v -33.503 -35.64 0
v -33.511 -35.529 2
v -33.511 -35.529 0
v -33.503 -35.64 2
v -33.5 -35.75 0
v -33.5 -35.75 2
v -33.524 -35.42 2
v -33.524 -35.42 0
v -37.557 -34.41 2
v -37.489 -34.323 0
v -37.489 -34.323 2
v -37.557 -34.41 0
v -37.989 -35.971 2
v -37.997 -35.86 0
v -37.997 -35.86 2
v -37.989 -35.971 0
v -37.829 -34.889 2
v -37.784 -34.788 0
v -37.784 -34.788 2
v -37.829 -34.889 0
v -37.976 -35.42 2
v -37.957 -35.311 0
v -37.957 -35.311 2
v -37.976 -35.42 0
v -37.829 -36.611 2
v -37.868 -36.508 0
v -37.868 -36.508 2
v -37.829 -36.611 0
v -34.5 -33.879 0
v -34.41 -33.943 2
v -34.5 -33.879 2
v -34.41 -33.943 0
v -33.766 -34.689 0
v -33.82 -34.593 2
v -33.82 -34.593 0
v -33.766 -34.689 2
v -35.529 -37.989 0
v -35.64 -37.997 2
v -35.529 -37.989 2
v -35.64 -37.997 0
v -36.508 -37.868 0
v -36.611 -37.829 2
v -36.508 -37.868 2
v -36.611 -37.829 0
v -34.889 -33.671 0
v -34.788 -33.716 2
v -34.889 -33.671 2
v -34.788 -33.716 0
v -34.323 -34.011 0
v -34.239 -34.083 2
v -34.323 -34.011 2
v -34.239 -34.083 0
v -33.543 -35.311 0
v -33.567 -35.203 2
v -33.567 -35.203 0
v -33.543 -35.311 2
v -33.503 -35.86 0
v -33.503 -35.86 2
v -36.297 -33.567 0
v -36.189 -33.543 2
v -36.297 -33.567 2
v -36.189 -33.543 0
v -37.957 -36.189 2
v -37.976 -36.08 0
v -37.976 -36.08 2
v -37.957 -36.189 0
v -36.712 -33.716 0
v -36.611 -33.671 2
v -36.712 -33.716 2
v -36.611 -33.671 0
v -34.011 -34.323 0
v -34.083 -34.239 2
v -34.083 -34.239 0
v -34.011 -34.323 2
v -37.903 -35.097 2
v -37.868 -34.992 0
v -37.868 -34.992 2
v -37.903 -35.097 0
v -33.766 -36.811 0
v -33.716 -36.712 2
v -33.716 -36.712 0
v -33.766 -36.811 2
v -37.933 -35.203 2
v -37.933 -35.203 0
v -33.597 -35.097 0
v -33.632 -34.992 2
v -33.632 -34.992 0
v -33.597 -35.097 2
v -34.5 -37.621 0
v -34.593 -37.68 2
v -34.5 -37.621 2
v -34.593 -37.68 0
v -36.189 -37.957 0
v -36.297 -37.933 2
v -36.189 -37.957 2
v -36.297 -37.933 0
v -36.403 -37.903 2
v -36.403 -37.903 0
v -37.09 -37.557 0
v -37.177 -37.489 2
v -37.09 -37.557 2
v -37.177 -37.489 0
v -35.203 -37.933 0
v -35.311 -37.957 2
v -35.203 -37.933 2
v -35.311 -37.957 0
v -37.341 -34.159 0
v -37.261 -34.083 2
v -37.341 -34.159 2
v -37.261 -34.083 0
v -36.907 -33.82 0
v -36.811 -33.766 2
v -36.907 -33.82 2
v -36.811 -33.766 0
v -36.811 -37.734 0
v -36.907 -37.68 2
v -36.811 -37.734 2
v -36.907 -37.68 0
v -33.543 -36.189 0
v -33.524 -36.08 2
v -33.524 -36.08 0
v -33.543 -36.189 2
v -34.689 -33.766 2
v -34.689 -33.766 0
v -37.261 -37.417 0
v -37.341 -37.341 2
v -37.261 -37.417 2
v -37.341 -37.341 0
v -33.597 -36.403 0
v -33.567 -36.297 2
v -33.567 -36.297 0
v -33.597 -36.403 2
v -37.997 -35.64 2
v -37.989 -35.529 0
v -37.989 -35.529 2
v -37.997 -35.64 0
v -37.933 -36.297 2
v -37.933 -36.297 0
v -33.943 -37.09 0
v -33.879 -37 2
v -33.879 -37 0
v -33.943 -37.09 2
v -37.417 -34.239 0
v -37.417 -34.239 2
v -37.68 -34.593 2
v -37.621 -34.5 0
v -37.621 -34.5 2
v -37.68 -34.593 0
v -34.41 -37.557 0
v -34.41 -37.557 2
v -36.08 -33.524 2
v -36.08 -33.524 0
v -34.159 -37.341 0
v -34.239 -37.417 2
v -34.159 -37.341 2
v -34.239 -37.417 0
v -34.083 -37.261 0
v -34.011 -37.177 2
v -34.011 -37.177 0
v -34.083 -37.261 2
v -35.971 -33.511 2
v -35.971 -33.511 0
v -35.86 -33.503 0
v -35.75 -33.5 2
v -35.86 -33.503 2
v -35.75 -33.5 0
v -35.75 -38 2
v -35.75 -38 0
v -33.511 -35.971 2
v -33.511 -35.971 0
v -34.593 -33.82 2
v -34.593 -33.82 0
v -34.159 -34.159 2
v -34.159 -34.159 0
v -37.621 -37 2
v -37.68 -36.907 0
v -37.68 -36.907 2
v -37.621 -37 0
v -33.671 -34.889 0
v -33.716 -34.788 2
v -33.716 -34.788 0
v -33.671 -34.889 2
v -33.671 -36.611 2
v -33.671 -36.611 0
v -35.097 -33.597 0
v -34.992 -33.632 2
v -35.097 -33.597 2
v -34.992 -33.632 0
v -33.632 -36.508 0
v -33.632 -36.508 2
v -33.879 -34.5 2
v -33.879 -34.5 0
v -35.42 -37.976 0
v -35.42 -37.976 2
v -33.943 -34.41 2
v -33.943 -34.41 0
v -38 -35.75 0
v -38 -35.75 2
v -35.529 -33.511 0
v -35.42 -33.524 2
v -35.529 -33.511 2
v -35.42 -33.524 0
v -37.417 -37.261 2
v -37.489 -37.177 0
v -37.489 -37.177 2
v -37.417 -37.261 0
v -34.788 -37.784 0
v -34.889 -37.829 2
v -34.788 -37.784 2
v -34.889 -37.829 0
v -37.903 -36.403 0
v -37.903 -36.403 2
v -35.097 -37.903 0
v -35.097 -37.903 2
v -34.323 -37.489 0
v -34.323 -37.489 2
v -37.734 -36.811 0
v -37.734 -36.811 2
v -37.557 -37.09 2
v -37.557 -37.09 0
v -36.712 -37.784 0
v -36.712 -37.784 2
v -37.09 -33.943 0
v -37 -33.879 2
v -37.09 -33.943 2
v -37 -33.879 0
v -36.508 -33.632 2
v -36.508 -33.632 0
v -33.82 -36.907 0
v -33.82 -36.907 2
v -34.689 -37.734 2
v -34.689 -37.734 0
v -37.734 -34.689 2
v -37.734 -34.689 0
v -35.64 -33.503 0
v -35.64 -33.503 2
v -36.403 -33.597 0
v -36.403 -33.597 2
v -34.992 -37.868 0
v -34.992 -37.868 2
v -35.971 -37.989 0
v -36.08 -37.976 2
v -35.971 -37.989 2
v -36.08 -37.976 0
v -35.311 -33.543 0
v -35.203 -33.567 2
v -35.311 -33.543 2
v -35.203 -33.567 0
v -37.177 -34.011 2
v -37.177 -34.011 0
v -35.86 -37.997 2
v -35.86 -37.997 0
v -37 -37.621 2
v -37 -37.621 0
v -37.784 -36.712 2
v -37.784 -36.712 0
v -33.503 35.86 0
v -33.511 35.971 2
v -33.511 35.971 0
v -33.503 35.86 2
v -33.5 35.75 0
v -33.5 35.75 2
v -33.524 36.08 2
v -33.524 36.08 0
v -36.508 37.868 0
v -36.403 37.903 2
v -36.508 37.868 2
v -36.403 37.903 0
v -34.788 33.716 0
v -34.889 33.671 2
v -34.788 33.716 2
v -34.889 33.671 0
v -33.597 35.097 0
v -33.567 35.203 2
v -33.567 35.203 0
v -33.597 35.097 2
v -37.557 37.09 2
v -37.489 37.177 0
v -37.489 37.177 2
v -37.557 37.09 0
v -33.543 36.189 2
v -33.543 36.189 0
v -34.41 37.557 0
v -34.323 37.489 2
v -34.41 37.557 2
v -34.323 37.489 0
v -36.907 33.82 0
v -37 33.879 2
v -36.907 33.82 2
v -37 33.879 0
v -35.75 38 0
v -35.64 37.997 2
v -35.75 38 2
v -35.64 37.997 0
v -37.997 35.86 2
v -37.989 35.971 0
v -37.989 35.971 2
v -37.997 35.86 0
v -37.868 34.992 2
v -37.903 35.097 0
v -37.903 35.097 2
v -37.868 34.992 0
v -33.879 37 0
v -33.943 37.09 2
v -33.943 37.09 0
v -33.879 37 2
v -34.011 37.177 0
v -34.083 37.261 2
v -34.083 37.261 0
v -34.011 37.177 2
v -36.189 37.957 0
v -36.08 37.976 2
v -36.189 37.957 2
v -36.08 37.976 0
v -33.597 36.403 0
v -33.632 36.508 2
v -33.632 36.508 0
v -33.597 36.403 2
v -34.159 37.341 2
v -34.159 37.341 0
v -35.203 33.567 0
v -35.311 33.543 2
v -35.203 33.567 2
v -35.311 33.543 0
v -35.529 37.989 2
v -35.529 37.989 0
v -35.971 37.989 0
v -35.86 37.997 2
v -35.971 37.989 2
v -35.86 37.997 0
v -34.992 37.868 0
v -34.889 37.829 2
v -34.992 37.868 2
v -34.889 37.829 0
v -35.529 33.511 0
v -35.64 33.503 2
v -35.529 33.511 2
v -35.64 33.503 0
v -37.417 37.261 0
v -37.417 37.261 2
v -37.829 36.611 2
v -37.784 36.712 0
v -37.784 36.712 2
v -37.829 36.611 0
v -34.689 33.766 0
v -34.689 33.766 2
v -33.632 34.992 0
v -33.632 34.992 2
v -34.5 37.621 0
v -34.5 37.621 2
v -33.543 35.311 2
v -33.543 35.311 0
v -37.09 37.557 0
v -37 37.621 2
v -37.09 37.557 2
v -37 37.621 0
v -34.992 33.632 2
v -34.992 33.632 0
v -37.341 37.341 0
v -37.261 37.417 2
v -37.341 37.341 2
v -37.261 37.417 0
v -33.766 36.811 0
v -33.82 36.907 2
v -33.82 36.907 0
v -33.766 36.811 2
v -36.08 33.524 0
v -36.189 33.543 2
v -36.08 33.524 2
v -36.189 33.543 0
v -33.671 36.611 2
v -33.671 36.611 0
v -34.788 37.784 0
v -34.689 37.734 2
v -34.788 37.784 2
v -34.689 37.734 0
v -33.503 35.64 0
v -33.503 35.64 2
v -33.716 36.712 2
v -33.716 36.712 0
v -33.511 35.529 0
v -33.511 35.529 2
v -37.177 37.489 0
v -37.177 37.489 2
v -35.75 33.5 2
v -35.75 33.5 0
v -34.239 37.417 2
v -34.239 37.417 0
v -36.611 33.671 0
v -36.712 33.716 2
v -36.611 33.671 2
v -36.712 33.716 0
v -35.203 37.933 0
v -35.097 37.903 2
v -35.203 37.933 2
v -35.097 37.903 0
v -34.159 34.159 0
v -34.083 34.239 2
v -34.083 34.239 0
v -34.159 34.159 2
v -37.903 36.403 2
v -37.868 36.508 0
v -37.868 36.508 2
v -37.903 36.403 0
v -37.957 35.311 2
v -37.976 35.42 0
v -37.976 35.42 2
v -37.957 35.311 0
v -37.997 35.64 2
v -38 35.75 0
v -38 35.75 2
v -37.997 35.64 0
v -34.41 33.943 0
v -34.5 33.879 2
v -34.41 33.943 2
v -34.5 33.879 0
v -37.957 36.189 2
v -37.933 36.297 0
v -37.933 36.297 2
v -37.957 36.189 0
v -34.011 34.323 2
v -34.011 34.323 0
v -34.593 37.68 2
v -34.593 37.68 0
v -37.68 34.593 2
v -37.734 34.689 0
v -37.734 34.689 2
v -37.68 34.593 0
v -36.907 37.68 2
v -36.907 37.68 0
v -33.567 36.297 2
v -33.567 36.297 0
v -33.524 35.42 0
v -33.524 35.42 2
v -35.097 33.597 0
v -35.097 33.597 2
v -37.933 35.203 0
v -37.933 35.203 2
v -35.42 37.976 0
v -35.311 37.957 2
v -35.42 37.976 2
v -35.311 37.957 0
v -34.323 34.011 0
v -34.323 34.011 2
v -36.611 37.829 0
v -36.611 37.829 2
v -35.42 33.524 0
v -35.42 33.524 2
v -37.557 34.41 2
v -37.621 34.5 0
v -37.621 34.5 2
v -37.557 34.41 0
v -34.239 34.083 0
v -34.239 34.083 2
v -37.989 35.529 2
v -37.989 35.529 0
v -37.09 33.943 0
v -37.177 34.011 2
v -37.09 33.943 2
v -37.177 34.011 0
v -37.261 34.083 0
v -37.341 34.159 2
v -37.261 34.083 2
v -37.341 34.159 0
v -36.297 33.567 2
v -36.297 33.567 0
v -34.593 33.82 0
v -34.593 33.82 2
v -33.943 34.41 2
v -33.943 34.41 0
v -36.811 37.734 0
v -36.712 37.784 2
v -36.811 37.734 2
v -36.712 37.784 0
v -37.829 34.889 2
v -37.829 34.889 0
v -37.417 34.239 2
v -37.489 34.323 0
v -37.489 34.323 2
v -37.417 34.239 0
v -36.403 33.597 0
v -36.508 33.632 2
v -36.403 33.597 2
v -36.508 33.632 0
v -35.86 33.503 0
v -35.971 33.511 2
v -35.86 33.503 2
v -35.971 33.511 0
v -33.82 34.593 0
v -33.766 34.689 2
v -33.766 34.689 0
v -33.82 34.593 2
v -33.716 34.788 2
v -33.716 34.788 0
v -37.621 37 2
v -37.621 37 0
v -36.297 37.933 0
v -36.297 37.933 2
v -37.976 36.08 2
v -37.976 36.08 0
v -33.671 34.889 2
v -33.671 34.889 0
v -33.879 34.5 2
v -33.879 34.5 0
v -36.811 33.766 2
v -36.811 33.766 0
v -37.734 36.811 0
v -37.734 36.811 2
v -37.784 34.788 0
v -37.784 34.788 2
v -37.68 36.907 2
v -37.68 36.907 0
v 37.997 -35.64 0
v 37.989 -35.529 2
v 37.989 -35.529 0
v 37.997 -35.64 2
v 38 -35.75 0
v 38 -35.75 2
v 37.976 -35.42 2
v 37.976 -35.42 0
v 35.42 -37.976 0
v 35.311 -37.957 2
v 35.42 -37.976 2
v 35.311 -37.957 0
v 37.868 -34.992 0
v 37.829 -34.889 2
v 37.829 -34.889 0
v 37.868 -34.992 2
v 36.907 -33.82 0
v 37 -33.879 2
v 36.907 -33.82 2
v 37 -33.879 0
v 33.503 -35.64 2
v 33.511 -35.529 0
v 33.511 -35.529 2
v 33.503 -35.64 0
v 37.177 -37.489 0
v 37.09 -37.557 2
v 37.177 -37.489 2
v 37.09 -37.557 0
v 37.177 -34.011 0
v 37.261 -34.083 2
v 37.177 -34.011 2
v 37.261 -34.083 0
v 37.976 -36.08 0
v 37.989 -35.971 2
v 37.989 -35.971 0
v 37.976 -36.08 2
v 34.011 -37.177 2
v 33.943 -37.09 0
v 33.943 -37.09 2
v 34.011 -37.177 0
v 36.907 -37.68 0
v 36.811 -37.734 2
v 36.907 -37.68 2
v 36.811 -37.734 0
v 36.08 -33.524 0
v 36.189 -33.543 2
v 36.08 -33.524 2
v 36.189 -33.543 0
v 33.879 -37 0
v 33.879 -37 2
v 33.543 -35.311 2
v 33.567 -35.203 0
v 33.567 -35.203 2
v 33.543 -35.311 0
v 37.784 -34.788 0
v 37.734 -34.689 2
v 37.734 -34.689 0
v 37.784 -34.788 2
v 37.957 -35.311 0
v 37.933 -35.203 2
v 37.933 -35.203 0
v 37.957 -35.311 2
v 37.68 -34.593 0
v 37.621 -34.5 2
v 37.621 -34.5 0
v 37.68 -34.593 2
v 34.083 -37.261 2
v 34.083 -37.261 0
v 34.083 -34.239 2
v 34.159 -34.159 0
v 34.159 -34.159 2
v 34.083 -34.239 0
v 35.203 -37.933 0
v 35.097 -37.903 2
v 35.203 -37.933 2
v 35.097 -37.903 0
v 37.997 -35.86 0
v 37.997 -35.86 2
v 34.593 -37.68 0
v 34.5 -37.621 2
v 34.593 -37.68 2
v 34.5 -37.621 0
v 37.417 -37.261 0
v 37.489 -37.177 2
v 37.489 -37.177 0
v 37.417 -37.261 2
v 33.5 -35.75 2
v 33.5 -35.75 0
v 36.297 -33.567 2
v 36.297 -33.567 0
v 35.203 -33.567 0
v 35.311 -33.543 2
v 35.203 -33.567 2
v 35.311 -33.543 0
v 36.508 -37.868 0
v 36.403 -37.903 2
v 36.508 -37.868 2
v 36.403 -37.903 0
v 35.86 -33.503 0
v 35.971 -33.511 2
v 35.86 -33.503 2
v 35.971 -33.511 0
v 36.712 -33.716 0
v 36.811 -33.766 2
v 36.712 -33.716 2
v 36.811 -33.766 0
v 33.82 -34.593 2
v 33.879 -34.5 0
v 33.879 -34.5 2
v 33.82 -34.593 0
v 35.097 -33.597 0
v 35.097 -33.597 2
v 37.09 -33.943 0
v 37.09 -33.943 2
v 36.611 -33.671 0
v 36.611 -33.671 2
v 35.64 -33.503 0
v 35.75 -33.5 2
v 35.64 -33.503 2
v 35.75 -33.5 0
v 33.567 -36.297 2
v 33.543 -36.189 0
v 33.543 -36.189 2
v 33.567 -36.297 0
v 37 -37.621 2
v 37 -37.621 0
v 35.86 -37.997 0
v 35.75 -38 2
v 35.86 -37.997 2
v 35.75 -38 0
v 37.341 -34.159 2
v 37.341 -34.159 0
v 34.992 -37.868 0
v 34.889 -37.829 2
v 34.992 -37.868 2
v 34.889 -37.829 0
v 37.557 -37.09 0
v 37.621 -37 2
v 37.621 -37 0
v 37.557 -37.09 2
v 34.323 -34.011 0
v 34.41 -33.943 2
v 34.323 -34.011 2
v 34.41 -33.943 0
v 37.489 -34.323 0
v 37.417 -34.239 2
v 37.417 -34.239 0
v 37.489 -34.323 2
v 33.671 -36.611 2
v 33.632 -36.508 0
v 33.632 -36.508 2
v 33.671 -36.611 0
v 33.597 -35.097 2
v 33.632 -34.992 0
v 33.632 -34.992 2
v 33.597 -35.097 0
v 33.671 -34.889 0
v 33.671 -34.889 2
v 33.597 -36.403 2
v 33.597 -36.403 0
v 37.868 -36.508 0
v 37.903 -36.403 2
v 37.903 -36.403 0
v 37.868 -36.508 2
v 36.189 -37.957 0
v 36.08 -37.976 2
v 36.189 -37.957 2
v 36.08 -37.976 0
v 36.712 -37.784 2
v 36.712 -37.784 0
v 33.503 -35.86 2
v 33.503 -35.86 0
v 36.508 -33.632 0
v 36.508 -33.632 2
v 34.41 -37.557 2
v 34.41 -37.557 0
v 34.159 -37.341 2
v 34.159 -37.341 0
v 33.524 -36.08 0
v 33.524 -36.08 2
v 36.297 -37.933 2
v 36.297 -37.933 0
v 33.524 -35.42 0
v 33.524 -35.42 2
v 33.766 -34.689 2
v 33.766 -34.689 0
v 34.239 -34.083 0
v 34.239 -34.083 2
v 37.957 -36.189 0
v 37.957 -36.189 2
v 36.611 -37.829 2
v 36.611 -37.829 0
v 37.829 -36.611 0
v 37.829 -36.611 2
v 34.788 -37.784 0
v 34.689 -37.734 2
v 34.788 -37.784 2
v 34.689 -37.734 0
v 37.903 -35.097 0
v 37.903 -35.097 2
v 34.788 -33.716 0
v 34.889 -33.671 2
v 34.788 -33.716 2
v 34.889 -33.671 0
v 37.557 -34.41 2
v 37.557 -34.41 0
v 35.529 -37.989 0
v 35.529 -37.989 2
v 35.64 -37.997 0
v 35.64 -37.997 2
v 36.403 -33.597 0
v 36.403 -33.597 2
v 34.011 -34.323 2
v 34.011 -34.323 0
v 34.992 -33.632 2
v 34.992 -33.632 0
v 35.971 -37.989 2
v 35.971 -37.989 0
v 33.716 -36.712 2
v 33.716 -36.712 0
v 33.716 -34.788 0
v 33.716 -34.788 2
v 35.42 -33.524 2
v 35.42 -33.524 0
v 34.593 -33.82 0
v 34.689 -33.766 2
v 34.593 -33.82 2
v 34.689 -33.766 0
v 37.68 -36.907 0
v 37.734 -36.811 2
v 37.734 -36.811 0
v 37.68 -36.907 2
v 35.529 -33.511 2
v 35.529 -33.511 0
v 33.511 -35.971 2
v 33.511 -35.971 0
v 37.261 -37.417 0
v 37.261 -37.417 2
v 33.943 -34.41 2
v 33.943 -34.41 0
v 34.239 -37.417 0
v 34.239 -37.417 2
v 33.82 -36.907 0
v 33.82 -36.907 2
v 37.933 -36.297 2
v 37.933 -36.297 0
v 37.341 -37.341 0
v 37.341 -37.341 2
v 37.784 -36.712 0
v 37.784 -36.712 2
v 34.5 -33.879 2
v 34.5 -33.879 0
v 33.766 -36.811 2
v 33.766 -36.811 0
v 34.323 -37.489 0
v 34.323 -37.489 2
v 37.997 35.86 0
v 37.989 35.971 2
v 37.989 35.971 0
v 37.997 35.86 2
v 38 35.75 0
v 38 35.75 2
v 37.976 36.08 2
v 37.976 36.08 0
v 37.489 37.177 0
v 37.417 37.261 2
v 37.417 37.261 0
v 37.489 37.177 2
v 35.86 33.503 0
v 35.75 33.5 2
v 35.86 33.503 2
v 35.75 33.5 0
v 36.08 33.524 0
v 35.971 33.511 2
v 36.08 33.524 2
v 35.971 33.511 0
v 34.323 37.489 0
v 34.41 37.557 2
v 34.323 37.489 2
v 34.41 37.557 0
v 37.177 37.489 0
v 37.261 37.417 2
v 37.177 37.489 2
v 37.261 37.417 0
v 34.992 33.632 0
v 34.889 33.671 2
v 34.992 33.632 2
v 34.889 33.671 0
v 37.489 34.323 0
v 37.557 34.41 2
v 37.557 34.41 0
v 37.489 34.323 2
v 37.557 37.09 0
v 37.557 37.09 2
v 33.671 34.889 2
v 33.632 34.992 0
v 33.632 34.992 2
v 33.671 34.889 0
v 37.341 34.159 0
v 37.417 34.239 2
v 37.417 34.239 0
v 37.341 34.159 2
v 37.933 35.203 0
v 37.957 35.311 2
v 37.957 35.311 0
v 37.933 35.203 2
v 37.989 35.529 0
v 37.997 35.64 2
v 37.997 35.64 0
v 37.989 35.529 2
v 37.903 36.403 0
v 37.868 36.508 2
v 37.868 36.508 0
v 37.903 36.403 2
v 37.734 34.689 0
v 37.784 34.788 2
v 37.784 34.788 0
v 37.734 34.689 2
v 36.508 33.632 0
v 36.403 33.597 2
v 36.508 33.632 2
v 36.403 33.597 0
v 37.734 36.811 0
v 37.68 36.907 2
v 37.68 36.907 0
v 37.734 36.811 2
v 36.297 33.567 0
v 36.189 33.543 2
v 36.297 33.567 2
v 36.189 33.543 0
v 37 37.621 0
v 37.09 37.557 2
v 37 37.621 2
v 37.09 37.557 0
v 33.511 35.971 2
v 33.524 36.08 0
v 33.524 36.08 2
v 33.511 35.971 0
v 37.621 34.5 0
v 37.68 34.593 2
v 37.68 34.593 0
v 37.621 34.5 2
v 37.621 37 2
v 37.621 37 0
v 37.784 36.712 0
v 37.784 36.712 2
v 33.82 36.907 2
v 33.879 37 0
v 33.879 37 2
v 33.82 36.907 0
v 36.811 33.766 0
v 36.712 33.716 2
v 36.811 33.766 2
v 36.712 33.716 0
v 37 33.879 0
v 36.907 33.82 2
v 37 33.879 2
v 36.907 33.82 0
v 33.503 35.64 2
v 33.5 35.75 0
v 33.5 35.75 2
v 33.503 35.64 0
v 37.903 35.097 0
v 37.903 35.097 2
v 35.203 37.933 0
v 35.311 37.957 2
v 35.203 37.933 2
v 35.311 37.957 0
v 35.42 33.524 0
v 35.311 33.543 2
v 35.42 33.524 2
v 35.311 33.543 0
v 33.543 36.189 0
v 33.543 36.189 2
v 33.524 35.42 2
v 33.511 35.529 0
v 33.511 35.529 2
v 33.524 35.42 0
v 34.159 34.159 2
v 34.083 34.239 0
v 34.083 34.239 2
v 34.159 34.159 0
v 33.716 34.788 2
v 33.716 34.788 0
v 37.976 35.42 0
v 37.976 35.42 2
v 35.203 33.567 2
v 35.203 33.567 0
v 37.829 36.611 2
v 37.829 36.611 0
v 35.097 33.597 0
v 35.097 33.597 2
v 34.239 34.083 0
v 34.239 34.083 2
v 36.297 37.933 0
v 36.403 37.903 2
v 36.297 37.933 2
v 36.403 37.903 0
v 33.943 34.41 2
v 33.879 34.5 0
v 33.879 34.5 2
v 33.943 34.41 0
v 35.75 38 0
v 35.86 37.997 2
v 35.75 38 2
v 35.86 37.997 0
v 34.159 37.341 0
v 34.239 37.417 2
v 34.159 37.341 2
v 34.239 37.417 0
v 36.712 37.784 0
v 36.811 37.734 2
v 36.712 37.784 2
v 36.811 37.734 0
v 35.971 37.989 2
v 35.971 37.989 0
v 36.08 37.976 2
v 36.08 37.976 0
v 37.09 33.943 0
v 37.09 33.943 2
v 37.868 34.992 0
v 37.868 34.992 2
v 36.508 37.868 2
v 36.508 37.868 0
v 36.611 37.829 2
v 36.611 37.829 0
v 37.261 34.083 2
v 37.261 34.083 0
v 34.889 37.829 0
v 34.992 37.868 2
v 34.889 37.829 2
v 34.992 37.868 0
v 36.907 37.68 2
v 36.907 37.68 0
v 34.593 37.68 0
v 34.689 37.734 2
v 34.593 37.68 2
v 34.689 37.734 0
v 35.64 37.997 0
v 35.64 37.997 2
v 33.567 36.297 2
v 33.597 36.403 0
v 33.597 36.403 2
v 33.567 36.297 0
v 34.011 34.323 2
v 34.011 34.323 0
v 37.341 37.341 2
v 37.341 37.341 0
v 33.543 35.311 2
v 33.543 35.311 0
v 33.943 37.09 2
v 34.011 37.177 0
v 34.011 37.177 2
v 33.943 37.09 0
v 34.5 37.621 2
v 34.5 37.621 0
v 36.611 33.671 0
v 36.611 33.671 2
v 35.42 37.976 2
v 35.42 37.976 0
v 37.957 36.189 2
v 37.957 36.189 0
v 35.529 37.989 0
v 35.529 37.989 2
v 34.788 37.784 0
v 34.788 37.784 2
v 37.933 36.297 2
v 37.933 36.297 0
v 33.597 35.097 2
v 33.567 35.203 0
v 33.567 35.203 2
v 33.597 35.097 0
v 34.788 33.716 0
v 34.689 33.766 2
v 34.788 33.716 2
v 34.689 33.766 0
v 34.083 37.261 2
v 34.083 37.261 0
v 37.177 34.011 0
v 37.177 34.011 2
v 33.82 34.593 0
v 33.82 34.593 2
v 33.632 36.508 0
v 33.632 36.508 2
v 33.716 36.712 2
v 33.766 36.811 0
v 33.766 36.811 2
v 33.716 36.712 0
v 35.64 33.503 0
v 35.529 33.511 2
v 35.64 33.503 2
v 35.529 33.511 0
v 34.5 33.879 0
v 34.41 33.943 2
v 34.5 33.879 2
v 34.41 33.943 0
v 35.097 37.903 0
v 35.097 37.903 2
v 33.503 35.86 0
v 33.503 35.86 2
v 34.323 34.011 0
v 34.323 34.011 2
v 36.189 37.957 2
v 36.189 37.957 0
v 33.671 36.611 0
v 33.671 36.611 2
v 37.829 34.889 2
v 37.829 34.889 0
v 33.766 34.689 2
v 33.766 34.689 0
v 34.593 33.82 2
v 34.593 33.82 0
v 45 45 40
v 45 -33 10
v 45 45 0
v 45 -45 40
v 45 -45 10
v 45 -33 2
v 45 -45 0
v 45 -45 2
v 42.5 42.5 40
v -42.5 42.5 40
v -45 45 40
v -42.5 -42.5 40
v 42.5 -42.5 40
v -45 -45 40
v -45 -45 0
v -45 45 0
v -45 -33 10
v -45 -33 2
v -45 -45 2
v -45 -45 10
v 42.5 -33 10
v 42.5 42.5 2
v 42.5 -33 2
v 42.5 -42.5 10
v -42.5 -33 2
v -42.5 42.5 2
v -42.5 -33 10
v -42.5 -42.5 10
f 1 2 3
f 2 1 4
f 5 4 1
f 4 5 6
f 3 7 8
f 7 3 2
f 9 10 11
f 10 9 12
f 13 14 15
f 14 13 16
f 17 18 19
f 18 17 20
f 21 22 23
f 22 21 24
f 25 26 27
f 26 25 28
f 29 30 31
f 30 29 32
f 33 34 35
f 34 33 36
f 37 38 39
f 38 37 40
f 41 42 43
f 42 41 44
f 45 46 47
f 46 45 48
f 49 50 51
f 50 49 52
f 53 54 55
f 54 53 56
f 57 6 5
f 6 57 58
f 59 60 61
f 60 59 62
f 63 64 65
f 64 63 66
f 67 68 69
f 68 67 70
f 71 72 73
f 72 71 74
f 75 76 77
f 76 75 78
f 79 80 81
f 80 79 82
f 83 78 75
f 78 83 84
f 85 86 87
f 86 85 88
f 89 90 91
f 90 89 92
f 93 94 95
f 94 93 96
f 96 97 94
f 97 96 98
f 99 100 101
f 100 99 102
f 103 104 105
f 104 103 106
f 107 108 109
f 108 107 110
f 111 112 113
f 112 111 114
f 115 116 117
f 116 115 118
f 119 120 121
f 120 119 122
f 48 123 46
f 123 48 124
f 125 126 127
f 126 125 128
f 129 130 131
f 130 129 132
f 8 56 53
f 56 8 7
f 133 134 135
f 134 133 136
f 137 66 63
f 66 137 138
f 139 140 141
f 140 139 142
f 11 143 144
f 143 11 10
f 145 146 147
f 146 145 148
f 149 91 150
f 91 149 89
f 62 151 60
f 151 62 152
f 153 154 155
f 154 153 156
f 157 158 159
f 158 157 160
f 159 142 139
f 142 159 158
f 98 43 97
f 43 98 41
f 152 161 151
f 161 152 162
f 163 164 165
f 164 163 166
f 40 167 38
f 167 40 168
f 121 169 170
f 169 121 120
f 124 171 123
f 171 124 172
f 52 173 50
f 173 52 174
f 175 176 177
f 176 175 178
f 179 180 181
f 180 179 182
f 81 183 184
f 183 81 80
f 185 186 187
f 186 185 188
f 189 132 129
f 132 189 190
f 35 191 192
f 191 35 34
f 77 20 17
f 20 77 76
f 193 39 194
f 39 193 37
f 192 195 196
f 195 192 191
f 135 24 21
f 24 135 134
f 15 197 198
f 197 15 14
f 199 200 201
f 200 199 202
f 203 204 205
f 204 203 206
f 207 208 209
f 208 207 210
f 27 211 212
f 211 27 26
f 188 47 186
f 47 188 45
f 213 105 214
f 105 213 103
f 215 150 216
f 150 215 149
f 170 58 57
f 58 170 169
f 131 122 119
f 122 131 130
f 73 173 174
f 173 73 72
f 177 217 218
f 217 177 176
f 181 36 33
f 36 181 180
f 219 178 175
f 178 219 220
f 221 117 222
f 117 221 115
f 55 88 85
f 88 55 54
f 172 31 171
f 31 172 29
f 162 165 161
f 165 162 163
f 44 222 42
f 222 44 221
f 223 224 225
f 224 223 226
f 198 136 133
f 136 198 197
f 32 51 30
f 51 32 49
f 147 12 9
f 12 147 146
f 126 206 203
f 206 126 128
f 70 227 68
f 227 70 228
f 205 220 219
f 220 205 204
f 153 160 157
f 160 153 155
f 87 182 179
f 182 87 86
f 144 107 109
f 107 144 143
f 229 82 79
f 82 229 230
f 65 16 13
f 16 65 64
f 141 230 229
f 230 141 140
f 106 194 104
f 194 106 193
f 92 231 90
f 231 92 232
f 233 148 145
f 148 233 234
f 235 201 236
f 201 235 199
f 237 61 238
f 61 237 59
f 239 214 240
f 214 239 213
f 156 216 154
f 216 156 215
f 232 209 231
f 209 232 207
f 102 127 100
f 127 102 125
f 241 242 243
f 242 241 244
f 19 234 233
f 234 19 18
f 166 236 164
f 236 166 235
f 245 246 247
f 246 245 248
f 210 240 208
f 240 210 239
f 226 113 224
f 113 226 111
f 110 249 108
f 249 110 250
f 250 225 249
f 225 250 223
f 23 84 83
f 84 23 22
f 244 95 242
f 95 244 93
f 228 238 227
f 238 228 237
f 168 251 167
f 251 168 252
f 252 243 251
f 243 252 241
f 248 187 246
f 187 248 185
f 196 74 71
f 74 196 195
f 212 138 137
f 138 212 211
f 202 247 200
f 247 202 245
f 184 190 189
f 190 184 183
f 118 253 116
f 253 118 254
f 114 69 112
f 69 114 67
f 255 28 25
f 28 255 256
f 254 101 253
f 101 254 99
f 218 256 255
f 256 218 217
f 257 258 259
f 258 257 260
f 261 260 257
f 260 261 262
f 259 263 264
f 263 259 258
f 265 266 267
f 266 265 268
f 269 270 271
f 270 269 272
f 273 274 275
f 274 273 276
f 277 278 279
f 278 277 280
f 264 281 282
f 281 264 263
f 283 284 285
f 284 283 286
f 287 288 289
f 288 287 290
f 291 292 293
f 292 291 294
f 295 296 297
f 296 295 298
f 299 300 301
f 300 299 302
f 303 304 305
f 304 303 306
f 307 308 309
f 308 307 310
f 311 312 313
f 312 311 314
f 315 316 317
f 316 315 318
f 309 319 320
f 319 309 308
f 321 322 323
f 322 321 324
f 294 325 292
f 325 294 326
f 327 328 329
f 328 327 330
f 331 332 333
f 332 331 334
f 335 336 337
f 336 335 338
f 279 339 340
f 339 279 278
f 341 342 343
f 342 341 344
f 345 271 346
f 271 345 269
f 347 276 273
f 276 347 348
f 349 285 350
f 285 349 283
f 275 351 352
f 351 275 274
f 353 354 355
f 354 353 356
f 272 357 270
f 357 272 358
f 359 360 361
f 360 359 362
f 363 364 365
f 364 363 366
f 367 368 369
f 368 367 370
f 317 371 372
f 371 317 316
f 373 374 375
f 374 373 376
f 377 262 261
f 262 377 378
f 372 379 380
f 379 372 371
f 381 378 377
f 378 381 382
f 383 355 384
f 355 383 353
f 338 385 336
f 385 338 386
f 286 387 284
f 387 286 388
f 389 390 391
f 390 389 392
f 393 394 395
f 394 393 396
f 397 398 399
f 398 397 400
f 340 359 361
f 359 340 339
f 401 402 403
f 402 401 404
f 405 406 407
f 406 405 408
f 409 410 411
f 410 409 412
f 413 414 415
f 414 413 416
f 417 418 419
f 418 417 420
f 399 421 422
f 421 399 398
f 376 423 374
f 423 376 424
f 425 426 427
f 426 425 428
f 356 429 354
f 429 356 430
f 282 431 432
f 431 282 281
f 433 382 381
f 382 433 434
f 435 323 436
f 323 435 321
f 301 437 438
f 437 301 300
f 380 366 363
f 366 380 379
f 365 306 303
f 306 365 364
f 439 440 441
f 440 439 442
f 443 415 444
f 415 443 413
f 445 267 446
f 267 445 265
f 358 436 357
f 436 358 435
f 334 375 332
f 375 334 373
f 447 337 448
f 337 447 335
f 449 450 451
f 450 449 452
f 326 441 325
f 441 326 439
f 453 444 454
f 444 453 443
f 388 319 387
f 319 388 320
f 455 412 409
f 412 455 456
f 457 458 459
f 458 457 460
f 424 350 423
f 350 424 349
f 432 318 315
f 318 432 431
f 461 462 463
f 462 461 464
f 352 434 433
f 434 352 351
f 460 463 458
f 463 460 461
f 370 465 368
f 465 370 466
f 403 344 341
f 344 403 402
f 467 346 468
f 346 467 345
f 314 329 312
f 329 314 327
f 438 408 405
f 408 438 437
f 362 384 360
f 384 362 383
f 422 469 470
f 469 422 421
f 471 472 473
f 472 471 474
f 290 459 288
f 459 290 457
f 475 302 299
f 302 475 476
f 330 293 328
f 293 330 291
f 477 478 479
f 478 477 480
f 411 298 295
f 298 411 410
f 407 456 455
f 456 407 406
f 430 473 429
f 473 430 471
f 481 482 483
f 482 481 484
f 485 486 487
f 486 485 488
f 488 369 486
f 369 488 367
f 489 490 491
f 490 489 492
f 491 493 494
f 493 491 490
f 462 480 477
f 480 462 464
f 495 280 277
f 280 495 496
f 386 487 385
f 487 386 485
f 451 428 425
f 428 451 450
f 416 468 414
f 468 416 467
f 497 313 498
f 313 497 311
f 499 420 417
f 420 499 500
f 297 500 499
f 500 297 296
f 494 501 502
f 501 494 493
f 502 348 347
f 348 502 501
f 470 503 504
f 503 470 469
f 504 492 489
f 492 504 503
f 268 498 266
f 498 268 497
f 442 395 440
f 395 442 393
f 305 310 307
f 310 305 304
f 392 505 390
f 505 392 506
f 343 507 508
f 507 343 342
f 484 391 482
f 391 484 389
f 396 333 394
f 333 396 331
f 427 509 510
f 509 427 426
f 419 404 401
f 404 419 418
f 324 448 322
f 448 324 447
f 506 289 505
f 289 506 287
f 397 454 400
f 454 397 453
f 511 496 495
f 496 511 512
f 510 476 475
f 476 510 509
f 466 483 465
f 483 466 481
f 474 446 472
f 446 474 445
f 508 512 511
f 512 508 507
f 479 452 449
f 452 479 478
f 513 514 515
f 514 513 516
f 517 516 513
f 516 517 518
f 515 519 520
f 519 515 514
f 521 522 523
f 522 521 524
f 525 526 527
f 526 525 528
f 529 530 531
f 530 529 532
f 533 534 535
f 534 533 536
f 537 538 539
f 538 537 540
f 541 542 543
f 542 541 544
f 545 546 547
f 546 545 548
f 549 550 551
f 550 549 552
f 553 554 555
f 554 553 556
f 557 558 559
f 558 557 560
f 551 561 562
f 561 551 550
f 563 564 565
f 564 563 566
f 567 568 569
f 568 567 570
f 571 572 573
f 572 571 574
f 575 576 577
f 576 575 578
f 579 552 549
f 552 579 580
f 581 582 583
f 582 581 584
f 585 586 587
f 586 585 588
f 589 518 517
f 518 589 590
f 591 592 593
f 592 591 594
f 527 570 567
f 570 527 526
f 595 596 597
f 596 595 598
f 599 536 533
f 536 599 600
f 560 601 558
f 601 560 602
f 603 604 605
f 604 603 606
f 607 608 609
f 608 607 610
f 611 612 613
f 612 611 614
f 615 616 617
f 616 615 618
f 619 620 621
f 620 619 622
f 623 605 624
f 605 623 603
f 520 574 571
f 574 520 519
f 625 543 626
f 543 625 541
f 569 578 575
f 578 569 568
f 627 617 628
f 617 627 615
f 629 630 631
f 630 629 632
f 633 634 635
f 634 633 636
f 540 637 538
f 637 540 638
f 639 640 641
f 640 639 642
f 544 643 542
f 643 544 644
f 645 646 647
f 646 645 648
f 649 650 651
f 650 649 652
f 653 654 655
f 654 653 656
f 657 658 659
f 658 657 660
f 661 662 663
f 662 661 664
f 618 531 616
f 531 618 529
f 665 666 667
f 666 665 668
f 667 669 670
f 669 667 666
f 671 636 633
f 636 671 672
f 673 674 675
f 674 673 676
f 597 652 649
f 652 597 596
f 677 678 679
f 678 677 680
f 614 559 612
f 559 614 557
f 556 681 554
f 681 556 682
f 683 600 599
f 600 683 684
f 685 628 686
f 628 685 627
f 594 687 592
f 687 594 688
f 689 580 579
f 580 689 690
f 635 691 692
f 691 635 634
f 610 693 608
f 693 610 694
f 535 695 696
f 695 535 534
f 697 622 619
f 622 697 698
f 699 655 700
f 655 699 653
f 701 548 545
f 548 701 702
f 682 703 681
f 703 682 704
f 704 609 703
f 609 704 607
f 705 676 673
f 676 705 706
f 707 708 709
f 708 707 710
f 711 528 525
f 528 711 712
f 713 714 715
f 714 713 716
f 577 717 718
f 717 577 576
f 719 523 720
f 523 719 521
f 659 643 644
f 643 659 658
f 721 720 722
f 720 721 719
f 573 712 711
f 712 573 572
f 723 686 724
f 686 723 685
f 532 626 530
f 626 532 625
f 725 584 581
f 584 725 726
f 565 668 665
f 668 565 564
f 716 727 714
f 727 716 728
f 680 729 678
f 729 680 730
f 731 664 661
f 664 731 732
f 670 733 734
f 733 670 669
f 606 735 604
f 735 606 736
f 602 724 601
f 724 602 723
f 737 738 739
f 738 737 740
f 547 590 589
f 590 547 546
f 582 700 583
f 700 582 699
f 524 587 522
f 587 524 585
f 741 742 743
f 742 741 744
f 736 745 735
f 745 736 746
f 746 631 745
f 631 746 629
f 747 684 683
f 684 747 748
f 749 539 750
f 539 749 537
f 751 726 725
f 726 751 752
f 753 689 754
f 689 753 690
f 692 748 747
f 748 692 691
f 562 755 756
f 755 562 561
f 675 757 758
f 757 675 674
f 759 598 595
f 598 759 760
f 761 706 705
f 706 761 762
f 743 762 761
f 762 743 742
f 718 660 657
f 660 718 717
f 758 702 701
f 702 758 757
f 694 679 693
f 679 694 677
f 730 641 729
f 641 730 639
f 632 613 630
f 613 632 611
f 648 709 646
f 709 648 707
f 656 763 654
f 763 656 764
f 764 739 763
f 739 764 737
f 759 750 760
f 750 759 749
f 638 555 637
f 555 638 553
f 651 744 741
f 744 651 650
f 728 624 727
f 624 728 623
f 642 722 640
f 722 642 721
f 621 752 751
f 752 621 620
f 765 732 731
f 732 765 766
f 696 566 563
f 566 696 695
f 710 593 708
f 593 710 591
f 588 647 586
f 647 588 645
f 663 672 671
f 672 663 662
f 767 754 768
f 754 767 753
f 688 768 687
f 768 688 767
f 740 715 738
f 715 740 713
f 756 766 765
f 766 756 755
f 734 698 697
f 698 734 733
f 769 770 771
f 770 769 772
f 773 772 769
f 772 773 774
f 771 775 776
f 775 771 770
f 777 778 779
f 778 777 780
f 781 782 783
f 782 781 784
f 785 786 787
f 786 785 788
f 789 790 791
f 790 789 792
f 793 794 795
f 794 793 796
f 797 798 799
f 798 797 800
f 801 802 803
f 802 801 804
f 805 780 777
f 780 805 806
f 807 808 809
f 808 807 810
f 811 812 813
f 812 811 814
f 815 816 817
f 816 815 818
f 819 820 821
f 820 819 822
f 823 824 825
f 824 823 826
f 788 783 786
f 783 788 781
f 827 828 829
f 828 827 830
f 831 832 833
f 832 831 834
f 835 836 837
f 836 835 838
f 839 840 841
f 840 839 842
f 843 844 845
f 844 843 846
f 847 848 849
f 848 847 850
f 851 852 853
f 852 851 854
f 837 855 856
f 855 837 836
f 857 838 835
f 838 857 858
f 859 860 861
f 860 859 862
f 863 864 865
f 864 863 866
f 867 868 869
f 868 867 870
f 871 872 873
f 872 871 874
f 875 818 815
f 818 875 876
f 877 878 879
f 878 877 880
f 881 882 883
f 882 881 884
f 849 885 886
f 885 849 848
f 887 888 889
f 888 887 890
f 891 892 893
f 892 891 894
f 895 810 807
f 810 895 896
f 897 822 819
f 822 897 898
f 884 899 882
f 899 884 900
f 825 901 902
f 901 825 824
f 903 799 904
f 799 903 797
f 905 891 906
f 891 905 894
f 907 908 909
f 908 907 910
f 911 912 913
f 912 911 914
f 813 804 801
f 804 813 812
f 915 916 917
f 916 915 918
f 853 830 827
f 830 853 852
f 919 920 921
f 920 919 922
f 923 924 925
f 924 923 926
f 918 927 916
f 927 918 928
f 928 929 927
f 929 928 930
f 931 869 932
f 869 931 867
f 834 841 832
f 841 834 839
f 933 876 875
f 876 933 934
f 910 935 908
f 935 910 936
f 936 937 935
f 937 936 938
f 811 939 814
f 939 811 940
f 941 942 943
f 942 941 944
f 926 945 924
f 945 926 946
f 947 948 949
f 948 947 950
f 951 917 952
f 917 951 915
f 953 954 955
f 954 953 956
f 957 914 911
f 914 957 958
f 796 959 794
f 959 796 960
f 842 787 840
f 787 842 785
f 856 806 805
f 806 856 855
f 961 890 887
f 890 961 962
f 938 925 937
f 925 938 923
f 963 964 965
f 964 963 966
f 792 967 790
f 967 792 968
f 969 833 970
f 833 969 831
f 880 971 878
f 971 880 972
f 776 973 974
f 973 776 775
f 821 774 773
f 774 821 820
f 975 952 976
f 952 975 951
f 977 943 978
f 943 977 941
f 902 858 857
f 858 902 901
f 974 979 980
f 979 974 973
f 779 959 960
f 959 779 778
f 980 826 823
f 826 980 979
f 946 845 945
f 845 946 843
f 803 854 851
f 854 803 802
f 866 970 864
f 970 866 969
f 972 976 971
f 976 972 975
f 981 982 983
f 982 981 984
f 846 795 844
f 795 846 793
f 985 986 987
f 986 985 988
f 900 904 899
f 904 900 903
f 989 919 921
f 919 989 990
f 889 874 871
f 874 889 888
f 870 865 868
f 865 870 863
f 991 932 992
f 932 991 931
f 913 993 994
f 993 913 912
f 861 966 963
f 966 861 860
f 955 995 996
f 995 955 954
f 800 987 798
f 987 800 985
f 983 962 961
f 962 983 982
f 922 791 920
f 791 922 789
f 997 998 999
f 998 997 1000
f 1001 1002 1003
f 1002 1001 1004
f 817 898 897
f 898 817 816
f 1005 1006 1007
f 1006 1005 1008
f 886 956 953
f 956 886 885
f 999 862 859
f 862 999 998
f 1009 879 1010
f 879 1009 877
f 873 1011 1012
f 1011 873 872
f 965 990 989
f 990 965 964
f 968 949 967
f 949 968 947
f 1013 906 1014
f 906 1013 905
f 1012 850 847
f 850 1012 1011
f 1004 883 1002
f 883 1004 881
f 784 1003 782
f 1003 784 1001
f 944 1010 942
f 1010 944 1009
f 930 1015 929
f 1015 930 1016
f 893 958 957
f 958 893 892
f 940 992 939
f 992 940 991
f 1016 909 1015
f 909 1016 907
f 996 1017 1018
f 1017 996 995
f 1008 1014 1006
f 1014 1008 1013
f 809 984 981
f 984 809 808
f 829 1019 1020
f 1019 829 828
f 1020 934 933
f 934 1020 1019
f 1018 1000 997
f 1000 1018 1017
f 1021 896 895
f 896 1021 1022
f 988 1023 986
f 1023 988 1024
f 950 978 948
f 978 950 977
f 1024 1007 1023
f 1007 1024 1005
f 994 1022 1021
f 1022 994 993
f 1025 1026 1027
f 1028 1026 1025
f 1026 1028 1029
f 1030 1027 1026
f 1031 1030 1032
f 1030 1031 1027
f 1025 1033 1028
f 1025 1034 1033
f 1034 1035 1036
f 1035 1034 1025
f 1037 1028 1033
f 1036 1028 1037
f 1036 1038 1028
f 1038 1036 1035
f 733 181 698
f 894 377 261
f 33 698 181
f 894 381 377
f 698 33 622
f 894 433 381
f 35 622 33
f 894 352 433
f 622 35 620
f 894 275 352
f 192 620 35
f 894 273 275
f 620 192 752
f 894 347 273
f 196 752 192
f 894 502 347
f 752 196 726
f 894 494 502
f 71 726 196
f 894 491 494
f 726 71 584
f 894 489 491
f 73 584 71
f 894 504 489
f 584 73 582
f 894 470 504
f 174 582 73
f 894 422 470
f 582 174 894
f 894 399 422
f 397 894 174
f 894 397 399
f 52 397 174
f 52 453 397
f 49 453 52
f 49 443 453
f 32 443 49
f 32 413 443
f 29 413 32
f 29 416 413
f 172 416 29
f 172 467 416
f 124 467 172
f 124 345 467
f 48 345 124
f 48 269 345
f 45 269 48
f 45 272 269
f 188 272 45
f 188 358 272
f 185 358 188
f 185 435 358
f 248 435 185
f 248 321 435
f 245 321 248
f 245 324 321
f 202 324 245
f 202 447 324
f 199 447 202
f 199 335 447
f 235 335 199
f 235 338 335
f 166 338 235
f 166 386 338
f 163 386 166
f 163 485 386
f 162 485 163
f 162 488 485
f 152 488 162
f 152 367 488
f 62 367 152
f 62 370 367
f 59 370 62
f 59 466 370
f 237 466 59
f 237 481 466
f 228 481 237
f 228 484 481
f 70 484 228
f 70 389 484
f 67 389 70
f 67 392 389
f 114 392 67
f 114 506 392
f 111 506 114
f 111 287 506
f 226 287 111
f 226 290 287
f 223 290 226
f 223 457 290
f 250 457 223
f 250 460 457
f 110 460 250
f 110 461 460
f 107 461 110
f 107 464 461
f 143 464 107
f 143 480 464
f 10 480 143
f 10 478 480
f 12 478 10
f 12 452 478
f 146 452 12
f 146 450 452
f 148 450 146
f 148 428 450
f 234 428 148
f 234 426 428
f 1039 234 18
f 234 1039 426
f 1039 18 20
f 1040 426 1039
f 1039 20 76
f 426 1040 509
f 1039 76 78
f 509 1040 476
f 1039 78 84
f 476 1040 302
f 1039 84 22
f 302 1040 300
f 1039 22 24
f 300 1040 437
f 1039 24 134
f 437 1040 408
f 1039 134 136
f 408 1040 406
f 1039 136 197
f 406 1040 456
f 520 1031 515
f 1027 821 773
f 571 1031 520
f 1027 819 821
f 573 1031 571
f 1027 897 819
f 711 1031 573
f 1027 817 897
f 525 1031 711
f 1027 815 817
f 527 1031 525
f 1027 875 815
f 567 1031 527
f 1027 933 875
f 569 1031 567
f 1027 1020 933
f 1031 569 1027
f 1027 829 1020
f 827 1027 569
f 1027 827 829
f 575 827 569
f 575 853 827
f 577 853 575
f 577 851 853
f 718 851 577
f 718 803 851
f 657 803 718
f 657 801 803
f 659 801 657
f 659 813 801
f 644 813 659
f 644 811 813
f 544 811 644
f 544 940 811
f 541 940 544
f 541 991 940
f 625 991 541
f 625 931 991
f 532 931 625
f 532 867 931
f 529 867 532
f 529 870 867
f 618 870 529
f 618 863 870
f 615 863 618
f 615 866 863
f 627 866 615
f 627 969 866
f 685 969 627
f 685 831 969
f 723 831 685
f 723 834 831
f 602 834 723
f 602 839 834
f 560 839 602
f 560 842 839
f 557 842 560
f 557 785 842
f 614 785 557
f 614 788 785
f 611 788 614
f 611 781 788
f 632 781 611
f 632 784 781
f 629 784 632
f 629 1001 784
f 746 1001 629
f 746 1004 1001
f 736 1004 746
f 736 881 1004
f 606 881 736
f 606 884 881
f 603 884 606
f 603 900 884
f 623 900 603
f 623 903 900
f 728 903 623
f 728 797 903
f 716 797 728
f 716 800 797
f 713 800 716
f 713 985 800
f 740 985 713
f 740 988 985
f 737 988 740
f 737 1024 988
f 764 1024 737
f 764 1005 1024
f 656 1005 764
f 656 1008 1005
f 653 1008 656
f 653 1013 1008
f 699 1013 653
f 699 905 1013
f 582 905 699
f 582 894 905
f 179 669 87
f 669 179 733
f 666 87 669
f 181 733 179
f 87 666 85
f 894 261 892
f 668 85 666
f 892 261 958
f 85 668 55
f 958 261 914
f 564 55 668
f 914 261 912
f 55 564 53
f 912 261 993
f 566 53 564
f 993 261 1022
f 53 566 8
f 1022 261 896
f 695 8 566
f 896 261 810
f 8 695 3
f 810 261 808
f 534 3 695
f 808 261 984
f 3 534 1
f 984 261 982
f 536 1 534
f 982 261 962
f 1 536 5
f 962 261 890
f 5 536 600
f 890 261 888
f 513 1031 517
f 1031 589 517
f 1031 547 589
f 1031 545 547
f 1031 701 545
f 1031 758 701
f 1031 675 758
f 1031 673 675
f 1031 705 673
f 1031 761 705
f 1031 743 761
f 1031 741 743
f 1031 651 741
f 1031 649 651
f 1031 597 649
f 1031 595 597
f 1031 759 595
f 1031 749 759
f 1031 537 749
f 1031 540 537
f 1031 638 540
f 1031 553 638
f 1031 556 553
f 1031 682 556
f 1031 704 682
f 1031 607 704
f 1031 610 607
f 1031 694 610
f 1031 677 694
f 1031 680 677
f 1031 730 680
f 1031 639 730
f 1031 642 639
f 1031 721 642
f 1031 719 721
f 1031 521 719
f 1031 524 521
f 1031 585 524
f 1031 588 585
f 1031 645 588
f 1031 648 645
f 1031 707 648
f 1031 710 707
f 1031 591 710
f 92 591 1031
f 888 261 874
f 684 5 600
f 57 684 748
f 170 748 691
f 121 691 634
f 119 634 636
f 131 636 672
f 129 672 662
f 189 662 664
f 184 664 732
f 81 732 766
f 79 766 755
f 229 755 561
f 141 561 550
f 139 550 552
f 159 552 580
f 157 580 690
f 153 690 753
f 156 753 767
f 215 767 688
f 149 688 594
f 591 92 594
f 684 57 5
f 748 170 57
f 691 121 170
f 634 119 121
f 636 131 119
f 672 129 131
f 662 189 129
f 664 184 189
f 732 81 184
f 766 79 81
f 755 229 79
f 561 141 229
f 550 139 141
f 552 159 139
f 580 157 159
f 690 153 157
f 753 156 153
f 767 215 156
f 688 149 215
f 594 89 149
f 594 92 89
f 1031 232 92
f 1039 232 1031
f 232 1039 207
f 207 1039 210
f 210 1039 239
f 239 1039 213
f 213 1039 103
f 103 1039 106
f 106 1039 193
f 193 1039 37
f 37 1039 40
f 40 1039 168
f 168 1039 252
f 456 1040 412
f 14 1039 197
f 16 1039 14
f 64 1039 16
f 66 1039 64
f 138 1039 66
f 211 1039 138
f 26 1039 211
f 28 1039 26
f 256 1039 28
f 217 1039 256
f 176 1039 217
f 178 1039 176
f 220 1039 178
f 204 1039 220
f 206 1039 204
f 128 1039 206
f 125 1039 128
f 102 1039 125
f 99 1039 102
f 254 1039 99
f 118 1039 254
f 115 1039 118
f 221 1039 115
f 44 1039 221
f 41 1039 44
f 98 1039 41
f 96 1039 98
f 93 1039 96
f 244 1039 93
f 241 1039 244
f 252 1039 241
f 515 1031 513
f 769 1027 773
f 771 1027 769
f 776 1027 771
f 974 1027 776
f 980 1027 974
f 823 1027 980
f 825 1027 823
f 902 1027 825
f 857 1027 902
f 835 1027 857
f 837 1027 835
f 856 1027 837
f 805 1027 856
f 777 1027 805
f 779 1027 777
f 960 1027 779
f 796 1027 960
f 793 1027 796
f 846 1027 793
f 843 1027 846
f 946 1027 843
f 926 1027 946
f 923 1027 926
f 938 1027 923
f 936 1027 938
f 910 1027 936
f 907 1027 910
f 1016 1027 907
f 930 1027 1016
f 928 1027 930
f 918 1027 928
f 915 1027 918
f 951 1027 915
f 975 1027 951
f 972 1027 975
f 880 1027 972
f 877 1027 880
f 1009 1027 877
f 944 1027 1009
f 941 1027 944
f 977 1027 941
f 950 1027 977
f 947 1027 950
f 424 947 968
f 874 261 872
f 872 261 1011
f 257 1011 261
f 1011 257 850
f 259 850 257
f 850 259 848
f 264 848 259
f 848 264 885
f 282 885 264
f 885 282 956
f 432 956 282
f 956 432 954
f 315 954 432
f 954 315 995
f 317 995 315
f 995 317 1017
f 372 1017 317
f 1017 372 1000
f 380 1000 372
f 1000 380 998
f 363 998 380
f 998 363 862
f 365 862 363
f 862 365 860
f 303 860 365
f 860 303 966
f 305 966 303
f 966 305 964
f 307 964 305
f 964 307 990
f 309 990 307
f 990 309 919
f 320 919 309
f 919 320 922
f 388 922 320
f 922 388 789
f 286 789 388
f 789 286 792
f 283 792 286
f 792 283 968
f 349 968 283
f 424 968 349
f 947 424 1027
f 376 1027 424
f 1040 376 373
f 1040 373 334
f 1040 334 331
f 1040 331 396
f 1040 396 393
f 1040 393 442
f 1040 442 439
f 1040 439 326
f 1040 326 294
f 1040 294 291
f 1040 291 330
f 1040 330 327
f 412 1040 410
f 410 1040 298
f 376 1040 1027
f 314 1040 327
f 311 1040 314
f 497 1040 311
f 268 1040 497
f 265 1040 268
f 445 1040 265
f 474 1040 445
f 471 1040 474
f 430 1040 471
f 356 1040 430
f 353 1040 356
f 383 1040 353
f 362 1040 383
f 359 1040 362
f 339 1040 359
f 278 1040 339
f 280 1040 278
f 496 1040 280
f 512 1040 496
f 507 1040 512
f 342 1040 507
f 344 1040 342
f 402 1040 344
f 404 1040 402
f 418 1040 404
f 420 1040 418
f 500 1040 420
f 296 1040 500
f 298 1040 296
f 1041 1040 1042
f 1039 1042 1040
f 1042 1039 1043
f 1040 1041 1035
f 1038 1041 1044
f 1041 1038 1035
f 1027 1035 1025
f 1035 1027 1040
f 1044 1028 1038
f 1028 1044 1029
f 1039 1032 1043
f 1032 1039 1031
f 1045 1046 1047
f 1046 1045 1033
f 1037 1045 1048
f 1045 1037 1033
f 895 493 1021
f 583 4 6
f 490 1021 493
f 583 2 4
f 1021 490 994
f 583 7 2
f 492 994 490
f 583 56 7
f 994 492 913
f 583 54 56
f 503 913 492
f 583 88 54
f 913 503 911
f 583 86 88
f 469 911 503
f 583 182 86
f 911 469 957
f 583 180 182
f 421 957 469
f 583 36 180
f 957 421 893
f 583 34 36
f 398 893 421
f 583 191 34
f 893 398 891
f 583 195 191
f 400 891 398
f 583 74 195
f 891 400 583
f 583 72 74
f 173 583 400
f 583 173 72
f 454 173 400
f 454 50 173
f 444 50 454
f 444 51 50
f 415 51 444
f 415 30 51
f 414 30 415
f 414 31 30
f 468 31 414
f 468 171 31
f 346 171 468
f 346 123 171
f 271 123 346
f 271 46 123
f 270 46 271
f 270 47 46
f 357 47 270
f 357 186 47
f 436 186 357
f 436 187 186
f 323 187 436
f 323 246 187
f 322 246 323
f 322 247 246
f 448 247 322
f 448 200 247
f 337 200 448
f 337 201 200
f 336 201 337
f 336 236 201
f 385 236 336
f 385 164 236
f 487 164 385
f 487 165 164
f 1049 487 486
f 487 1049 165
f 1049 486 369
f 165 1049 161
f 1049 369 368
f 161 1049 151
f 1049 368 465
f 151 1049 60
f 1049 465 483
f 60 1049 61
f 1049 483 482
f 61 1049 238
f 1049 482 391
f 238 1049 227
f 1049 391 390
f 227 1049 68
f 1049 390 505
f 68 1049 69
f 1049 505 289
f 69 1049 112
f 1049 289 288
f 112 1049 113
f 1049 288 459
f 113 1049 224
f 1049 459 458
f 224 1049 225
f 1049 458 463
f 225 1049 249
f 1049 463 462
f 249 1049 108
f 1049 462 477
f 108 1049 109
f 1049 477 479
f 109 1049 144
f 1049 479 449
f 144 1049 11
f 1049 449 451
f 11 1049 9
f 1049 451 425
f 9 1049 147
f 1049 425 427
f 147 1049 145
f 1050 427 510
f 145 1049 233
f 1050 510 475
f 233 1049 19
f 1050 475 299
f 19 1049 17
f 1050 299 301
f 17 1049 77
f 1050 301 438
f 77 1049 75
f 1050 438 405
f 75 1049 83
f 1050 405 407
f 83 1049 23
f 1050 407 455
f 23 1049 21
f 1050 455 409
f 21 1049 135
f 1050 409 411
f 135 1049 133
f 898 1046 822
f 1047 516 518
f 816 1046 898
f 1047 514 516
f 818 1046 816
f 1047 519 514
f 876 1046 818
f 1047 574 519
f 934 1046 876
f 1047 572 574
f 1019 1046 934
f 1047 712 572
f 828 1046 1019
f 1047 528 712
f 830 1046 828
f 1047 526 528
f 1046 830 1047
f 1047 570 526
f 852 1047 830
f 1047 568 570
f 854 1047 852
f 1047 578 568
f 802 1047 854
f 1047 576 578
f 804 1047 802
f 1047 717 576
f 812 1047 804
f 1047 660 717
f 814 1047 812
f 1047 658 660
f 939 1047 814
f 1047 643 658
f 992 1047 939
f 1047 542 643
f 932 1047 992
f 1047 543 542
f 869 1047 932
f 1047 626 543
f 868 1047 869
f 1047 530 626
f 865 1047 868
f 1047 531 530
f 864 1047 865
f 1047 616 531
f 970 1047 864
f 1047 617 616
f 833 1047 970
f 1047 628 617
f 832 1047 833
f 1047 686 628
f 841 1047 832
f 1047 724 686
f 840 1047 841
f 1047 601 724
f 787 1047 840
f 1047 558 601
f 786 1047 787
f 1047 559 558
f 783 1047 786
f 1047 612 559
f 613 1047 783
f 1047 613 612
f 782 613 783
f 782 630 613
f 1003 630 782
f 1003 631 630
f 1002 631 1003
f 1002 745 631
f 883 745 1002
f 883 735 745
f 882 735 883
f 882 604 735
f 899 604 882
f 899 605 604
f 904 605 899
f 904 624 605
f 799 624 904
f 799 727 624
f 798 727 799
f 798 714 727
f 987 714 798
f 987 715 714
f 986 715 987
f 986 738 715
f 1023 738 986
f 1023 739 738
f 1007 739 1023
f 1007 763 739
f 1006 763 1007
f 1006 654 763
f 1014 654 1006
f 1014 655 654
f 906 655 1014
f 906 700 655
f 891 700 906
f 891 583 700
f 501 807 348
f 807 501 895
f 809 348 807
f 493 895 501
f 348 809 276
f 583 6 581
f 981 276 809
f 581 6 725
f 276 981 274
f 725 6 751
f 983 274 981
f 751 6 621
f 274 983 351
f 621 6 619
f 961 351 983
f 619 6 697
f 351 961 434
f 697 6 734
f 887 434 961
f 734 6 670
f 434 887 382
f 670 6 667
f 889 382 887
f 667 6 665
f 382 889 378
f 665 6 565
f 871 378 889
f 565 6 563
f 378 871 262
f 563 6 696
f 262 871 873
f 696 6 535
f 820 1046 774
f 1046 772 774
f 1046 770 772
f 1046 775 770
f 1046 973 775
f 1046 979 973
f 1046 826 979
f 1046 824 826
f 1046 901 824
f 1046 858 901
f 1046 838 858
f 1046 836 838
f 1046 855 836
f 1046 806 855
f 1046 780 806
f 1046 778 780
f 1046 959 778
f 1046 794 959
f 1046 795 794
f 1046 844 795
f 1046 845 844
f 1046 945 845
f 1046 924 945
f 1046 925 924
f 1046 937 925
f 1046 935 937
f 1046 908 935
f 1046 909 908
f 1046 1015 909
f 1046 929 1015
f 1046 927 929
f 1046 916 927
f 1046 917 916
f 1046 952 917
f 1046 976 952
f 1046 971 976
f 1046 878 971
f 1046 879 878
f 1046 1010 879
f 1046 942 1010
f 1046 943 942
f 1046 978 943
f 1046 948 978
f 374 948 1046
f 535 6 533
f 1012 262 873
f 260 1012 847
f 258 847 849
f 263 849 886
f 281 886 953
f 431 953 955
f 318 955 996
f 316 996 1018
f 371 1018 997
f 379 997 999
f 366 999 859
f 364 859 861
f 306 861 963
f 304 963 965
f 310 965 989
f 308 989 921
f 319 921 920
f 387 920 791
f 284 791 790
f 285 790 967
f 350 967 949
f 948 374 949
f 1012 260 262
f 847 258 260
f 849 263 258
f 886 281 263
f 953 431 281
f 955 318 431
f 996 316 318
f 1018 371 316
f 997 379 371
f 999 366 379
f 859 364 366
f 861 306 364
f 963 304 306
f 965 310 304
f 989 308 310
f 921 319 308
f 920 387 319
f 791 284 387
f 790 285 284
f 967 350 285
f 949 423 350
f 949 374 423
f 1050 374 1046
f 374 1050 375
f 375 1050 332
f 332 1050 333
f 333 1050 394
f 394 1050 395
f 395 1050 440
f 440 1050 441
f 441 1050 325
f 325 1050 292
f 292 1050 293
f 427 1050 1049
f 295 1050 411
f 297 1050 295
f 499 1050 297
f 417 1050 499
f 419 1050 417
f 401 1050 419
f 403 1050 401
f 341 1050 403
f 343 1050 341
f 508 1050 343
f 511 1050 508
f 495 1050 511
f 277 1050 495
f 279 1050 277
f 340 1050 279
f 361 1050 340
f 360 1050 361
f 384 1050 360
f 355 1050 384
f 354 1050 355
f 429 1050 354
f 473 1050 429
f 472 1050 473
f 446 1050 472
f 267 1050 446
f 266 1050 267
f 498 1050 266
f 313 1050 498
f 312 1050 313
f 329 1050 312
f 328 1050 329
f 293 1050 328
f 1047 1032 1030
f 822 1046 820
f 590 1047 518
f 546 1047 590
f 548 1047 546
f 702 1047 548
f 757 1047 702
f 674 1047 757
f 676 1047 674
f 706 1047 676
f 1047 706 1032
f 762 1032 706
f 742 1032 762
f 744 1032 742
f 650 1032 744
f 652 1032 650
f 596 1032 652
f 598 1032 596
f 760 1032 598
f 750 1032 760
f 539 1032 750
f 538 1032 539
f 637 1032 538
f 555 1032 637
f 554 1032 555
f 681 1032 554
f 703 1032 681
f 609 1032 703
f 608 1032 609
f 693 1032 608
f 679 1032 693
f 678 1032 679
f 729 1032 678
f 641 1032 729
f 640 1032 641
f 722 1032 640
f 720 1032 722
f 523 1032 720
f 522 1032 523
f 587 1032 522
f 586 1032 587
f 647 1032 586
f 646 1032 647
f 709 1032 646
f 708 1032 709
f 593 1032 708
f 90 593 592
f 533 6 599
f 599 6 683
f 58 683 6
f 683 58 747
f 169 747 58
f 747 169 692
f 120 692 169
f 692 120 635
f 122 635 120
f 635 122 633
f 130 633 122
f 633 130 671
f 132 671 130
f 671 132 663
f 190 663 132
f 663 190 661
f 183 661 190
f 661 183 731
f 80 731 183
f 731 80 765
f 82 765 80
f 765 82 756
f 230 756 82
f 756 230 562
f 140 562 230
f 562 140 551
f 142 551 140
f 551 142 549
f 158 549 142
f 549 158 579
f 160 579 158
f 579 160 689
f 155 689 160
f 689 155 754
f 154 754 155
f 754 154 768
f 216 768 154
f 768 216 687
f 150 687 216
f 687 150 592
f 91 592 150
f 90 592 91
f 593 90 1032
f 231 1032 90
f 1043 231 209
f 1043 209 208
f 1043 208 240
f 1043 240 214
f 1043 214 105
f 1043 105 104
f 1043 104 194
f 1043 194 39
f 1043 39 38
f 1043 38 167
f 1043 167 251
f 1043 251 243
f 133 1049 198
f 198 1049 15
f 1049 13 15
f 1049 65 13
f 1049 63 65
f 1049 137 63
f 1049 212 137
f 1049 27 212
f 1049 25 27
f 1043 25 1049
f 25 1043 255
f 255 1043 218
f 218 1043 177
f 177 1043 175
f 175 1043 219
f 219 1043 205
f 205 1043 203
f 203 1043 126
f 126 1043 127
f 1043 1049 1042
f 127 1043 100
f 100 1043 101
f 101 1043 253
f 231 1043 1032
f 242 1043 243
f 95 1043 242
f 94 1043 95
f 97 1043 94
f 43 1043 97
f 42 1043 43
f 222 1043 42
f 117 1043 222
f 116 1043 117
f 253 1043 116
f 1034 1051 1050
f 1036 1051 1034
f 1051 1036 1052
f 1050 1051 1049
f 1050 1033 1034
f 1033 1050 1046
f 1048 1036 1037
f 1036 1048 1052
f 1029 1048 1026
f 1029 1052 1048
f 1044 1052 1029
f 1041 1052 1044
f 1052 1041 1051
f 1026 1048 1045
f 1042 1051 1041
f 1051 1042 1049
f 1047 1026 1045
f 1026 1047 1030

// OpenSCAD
// Magnetic stirrer housing for an 80 mm PC case fan
// Print orientation: top plate on bed (z = 0), walls rise to z = 40, open top

// ---------- Parameters ----------
top_thickness      = 2;     // top plate thickness
wall_thickness     = 2.5;   // wall thickness
box_height         = 40;    // total height to open edge
outer_size         = 90;    // outer X and Y size of box
screw_hole_d       = 4.5;   // M4 screw hole diameter
screw_hole_pitch   = 71.5;  // square pattern pitch for screw holes
cable_notch_w      = 12;    // cable notch width
cable_notch_depth  = 8;     // notch depth from open edge (z = 32 to 40)
eps                = 0.5;   // cutter overshoot past faces

$fn = 128;

// ---------- Derived ----------
inner_size = outer_size - 2 * wall_thickness;   // 85 x 85
floor_z    = top_thickness;                     // z = 2, floor of open box

// ---------- Model ----------
difference() {
    // Solid block: top plate + walls
    translate([-outer_size/2, -outer_size/2, 0])
        cube([outer_size, outer_size, box_height]);

    // Open top (through the walls)
    translate([-inner_size/2, -inner_size/2, floor_z])
        cube([inner_size, inner_size, box_height - floor_z + eps]);

    // Screw holes in top plate, centred on plate
    for (sx = [-screw_hole_pitch/2, screw_hole_pitch/2],
         sy = [-screw_hole_pitch/2, screw_hole_pitch/2])
        translate([sx, sy, -eps])
            cylinder(d = screw_hole_d, h = top_thickness + 2*eps);

    // Cable notch in one wall, centred along the wall
    translate([-outer_size/2, -outer_size/2, floor_z])
        cube([outer_size, cable_notch_w, cable_notch_depth]);
}
